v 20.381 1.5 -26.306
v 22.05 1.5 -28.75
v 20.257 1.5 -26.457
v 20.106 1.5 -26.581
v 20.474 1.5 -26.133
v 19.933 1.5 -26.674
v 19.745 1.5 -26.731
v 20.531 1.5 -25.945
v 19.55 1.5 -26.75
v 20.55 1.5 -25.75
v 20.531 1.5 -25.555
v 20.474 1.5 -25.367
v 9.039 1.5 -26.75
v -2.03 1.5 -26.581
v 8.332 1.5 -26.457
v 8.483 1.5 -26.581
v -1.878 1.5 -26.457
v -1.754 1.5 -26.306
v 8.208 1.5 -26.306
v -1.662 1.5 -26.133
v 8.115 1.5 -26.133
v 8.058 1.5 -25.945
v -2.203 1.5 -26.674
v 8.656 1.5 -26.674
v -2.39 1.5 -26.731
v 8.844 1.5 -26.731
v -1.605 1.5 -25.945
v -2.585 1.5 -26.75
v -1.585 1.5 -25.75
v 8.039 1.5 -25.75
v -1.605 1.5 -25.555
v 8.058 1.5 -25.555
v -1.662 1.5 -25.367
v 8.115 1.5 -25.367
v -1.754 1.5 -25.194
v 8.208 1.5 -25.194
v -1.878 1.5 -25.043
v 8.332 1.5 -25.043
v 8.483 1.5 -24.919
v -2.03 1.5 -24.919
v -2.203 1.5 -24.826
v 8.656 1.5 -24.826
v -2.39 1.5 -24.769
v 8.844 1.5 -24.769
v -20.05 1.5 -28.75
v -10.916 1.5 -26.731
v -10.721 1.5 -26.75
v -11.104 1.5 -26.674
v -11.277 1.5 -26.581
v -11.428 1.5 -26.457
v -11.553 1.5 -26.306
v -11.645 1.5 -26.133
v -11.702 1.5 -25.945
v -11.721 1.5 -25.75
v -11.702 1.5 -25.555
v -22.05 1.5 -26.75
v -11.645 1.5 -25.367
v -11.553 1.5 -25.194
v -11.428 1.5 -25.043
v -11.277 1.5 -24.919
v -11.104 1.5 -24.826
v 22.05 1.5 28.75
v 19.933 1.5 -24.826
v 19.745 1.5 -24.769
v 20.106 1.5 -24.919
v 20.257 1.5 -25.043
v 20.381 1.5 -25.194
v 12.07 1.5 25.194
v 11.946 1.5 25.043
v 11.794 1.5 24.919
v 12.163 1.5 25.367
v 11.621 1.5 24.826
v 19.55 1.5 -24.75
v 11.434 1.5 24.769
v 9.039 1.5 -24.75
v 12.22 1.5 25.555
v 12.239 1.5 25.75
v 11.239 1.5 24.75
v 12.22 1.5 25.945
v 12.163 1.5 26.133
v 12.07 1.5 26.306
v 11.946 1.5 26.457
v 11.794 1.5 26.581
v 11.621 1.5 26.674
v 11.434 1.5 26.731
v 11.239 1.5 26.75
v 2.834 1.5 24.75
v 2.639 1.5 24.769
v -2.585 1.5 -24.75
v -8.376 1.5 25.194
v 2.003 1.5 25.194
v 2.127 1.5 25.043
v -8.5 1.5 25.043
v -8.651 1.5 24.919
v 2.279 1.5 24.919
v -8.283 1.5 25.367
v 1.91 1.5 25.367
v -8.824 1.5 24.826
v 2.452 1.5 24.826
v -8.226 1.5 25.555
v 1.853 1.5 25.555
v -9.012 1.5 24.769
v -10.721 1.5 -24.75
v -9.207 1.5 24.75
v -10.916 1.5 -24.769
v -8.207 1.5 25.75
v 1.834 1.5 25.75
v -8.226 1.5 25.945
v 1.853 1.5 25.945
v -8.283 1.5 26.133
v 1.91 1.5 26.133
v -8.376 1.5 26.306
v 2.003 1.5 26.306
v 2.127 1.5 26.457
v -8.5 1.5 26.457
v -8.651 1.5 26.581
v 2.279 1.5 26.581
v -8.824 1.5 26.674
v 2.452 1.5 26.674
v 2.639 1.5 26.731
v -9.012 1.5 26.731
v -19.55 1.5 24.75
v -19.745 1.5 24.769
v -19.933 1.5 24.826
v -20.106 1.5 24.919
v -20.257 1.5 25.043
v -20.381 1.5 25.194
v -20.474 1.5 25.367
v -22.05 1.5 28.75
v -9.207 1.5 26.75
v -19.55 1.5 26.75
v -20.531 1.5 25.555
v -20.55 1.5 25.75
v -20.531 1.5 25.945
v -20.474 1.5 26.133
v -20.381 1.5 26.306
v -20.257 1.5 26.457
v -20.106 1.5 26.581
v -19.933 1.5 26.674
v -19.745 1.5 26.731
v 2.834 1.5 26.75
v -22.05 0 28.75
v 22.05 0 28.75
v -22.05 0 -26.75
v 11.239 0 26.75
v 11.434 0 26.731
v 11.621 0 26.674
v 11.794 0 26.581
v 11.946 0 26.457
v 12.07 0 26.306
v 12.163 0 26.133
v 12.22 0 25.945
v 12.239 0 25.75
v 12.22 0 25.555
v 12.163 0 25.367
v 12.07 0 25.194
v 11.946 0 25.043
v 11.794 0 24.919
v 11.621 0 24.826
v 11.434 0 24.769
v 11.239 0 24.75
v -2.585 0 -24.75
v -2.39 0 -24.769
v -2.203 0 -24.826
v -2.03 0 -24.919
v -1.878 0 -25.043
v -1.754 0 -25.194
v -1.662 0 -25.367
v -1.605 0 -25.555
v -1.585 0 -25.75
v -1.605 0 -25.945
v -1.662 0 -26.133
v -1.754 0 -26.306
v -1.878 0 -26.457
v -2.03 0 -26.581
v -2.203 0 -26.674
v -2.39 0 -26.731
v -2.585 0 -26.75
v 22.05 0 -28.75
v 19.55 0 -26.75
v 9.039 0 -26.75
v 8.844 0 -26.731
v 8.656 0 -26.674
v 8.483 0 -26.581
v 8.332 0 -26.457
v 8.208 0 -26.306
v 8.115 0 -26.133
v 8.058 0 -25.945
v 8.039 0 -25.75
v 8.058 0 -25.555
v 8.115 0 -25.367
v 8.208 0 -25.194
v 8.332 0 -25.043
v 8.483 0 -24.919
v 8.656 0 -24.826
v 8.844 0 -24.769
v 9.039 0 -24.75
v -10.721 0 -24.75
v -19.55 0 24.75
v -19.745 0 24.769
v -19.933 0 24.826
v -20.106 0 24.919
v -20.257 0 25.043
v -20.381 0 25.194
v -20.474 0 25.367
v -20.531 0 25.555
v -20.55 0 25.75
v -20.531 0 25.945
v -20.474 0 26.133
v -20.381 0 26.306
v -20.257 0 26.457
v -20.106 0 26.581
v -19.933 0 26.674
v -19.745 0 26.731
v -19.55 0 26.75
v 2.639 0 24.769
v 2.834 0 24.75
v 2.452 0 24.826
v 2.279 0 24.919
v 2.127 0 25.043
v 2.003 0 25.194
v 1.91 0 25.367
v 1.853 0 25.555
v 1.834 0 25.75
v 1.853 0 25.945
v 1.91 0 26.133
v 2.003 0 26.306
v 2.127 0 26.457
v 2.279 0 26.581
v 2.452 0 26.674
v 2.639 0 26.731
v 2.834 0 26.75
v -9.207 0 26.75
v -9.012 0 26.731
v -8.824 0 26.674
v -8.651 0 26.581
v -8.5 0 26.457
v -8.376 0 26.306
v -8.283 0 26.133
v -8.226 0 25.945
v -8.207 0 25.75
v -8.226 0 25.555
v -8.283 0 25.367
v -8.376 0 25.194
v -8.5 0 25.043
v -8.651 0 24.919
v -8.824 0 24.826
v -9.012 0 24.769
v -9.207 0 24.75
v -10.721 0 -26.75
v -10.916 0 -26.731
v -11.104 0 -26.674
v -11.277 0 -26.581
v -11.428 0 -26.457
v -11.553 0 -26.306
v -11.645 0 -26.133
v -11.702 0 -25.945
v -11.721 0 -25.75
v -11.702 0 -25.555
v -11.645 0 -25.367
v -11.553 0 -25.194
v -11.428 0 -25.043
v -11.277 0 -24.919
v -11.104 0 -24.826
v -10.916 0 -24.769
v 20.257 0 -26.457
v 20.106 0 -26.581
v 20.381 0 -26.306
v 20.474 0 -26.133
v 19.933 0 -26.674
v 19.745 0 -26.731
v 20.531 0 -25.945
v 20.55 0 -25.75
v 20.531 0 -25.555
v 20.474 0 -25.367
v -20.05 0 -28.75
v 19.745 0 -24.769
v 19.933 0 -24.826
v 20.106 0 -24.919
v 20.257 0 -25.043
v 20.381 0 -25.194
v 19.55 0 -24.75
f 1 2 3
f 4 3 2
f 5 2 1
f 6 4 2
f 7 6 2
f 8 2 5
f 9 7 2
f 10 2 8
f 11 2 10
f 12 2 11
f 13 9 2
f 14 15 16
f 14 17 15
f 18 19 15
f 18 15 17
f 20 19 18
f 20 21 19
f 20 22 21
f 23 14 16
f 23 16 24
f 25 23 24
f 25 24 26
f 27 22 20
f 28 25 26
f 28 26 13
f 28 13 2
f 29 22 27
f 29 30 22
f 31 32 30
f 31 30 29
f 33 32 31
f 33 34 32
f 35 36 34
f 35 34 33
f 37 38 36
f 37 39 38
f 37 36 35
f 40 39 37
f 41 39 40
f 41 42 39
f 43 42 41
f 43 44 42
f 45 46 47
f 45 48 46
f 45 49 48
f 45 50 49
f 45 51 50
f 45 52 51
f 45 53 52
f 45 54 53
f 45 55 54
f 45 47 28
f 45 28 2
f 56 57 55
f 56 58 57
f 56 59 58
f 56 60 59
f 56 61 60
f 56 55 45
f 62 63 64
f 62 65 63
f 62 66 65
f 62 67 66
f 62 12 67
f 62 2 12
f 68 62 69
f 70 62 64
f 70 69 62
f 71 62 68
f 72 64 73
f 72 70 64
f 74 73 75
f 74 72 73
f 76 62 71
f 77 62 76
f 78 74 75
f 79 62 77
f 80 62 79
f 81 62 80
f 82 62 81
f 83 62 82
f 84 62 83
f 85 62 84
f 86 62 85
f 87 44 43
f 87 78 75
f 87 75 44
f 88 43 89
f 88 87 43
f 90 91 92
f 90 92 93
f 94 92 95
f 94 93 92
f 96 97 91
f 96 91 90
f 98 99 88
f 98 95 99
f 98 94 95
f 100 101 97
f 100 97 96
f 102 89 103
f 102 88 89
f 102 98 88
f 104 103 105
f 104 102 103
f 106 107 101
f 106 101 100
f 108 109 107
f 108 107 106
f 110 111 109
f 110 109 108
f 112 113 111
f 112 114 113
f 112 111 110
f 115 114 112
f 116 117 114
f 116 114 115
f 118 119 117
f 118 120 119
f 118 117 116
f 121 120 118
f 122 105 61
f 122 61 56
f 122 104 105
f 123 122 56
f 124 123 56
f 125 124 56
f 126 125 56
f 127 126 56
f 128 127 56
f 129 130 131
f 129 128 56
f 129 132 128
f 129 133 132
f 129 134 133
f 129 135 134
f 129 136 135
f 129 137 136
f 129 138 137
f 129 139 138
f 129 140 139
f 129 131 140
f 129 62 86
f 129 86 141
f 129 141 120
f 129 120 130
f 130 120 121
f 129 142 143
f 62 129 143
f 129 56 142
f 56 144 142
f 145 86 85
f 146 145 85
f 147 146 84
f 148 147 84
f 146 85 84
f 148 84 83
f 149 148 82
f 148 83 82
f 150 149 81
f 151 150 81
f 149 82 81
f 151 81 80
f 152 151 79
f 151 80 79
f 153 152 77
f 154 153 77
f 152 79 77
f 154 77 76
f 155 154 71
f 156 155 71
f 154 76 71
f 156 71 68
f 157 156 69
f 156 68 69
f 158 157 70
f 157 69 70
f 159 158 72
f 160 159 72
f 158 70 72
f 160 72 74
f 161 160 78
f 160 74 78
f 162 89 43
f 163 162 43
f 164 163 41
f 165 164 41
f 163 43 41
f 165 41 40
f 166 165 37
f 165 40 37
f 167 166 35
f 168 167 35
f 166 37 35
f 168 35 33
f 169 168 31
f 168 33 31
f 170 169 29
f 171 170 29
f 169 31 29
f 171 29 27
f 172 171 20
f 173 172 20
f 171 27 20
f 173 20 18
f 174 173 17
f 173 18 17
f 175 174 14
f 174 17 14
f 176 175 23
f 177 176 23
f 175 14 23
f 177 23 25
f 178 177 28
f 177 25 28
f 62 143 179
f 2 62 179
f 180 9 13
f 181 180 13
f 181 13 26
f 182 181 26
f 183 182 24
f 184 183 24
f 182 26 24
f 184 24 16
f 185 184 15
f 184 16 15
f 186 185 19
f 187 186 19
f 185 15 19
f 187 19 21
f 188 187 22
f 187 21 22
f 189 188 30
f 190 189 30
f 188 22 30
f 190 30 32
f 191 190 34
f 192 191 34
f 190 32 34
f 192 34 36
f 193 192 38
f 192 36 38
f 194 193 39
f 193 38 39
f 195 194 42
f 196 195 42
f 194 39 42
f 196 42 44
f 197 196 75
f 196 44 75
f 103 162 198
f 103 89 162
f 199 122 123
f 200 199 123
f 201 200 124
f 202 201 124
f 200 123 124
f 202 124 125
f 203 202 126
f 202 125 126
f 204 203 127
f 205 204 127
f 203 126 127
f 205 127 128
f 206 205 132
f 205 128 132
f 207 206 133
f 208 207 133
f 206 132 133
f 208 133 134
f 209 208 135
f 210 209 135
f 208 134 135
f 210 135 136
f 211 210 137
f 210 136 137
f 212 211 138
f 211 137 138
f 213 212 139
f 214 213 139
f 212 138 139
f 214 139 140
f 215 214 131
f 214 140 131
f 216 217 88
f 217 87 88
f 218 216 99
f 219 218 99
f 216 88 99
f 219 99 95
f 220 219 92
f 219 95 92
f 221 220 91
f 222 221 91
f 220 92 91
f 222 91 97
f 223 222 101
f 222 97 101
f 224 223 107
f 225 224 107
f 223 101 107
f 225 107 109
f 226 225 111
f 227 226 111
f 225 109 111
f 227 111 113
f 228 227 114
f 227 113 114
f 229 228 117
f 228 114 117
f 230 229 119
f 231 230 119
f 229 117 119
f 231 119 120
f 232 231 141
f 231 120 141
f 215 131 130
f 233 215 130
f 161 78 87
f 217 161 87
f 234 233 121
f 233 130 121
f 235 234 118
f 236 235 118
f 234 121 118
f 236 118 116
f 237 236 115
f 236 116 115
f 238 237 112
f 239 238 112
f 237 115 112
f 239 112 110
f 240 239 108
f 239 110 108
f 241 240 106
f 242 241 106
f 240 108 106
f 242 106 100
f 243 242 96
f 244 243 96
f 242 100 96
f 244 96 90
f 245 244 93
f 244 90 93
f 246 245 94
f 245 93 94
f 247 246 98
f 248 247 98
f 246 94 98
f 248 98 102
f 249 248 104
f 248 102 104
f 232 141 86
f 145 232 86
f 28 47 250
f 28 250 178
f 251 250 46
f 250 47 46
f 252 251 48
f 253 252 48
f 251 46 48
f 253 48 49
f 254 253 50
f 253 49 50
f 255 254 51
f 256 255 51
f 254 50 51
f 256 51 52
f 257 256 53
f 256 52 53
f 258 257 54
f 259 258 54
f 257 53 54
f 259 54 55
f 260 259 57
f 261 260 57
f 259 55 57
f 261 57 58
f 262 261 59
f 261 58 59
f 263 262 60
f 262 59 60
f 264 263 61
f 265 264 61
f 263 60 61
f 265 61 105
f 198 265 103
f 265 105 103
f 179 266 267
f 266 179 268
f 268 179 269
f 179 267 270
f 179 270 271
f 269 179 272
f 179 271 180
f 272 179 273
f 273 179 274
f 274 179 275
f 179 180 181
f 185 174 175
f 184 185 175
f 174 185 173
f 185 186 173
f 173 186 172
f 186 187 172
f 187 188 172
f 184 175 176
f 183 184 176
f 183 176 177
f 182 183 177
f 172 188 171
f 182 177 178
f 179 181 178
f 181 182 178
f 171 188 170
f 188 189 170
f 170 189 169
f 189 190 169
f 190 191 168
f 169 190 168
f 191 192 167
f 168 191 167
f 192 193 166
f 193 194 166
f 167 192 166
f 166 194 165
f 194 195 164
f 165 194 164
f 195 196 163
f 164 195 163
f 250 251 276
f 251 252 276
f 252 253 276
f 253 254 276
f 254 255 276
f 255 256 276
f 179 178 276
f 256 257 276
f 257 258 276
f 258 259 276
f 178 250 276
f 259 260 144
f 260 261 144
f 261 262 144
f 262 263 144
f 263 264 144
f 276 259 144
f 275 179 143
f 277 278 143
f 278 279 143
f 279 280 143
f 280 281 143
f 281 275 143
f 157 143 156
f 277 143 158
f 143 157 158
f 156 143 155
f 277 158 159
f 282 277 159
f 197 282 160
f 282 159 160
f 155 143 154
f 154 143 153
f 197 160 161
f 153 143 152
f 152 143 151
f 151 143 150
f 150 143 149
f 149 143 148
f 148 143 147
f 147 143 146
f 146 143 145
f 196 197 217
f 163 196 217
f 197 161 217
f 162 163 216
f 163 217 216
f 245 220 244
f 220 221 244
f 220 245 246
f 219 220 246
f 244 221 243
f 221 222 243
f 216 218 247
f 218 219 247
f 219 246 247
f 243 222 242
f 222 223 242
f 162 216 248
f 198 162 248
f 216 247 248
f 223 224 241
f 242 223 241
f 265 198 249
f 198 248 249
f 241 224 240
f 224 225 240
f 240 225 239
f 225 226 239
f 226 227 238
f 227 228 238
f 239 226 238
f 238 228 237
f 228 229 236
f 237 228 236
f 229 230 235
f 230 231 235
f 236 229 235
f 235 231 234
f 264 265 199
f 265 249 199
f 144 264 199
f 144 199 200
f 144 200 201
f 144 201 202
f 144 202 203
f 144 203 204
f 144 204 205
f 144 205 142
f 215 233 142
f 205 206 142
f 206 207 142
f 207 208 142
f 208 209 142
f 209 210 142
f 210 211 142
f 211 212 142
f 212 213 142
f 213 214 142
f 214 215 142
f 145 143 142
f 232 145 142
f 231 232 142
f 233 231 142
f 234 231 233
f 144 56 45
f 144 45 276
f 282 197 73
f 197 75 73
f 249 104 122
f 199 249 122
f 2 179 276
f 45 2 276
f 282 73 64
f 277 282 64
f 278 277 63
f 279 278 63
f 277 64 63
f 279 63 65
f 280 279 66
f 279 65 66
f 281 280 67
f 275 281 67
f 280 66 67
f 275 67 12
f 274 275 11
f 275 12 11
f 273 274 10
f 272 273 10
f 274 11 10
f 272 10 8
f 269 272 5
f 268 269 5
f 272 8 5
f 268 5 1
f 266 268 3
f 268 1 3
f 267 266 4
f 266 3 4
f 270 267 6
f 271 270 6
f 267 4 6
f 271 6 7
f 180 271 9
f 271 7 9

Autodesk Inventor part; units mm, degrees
ref_plane "YZ Plane" through (0, 0, 0) normal (1, 0, 0) x (0, 1, 0)
ref_plane "XZ Plane" through (0, 0, 0) normal (0, 1, 0) x (-1, 0, 0)
ref_plane "XY Plane" through (0, 0, 0) normal (0, 0, 1) x (1, 0, 0)
sketch "Sketch1" plane through (0, 0, 0) normal (0, 1, 0) x (-1, 0, 0)
  line L0 (-22.05, -28.75) -> (22.05, -28.75)
  line L1 (22.05, -28.75) -> (22.05, 28.75)
  line L2 (22.05, 28.75) -> (-22.05, 28.75)
  line L3 (-22.05, 28.75) -> (-22.05, -28.75)
  line L4 (-22.05, -28.75) -> (22.05, 28.75) construction
  line L5 (22.05, -28.75) -> (-22.05, 28.75) construction
  point P0 (0, 0)
  dimension "d0" = 57.5
  dimension "d1" = 44.1
extrude "Extrusion1" add sketch "Sketch1" along normal blind 1.5
sketch "Sketch4" plane through (0, 1.5, 0) normal (0, 1, 0) x (1, 0, 0)
  line L0 (22.6381, -25.9185) -> (13.7388, -25.9185)
  line L1 (13.7388, -25.9185) -> (13.7388, -21.956)
  line L2 (13.7388, -21.956) -> (22.6381, -21.956)
  line L3 (22.6381, -21.956) -> (22.6381, -25.9185)
  line L4 (11.4165, -21.956) -> (0.7633, -21.956)
  line L5 (0.7633, -21.956) -> (0.7633, -24.4569)
  line L6 (0.7633, -24.4569) -> (11.4165, -24.4569)
  line L7 (11.4165, -24.4569) -> (11.4165, -21.956)
  line L8 (-0.6658, -26.6006) -> (-6.707, -26.6006)
  line L9 (-6.707, -26.6006) -> (-6.707, -22.3783)
  line L10 (-6.707, -22.3783) -> (-0.6658, -22.3783)
  line L11 (-0.6658, -22.3783) -> (-0.6658, -26.6006)
  line L12 (-6.707, -24.392) -> (-14.5426, -24.392)
  line L13 (-14.5426, -24.392) -> (-14.5426, -21.0953)
  line L14 (-14.5426, -21.0953) -> (-6.707, -21.0953)
  line L15 (-6.707, -21.0953) -> (-6.707, -24.392)
  line L16 (-14.5426, -21.0953) -> (-11.8996, -21.0953)
  line L17 (-11.8996, -21.0953) -> (-11.8996, -19.5363)
  line L18 (-11.8996, -19.5363) -> (-14.5426, -19.5363)
  line L19 (-14.5426, -19.5363) -> (-14.5426, -21.0953)
  line L20 (-21.1238, -24.2621) -> (-17.4211, -24.2621)
  line L21 (-17.4211, -24.2621) -> (-17.4211, -21.956)
  line L22 (-17.4211, -21.956) -> (-21.1238, -21.956)
  line L23 (-21.1238, -21.956) -> (-21.1238, -24.2621)
  line L24 (5.6616, -20.7705) -> (1.894, -20.7705)
  line L25 (1.894, -20.7705) -> (1.894, -17.3277)
  line L26 (1.894, -17.3277) -> (5.6616, -17.3277)
  line L27 (5.6616, -17.3277) -> (5.6616, -20.7705)
  line L28 (-2.848, -19.9261) -> (-5.2515, -19.9261)
  line L29 (-5.2515, -19.9261) -> (-5.2515, -18.3346)
  line L30 (-5.2515, -18.3346) -> (-2.848, -18.3346)
  line L31 (-2.848, -18.3346) -> (-2.848, -19.9261)
  line L32 (-17.2689, -17.0029) -> (-14.5426, -17.0029)
  line L33 (-14.5426, -17.0029) -> (-14.5426, -13.4952)
  line L34 (-14.5426, -13.4952) -> (-17.2689, -13.4952)
  line L35 (-17.2689, -13.4952) -> (-17.2689, -17.0029)
  line L36 (15.925, -11.4814) -> (12.4173, -11.4814)
  line L37 (12.4173, -11.4814) -> (12.4173, -14.7294)
  line L38 (12.4173, -14.7294) -> (15.925, -14.7294)
  line L39 (15.925, -14.7294) -> (15.925, -11.4814)
  line L40 (-2.1335, 9.0455) -> (1.894, 9.0455)
  line L41 (1.894, 9.0455) -> (1.894, -8.9481)
  line L42 (1.894, -8.9481) -> (-2.1335, -8.9481)
  line L43 (-2.1335, -8.9481) -> (-2.1335, 9.0455)
  line L44 (4.5573, 3.3291) -> (1.6991, 3.3291)
  line L45 (1.6991, 3.3291) -> (1.6991, 0.6009)
  line L46 (1.6991, 0.6009) -> (4.5573, 0.6009)
  line L47 (4.5573, 0.6009) -> (4.5573, 3.3291)
  line L48 (-17.5287, 13.7631) -> (-14.1519, 13.7631)
  line L49 (-14.1519, 13.7631) -> (-14.1519, 10.4096)
  line L50 (-14.1519, 10.4096) -> (-17.5287, 10.4096)
  line L51 (-17.5287, 10.4096) -> (-17.5287, 13.7631)
  line L52 (16.8052, 16.3739) -> (14.7212, 16.3739)
  line L53 (14.7212, 16.3739) -> (14.7212, 12.9633)
  line L54 (14.7212, 12.9633) -> (16.8052, 12.9633)
  line L55 (16.8052, 12.9633) -> (16.8052, 16.3739)
  line L56 (-23.3919, 26.0219) -> (-13.2211, 26.0219)
  line L57 (-13.2211, 26.0219) -> (-13.2211, 21.0711)
  line L58 (-13.2211, 21.0711) -> (-23.3919, 21.0711)
  line L59 (-23.3919, 21.0711) -> (-23.3919, 26.0219)
  line L60 (-20.3793, 16.7032) -> (-17.8455, 16.7032)
  line L61 (-17.8455, 16.7032) -> (-17.8455, 19.4346)
  line L62 (-17.8455, 19.4346) -> (-20.3793, 19.4346)
  line L63 (-20.3793, 19.4346) -> (-20.3793, 16.7032)
  line L64 (-11.1745, 21.8169) -> (-0.7032, 21.8169)
  line L65 (-0.7032, 21.8169) -> (-0.7032, 24.5446)
  line L66 (-0.7032, 24.5446) -> (-11.1745, 24.5446)
  line L67 (-11.1745, 24.5446) -> (-11.1745, 21.8169)
  line L68 (-2.5673, 18.6812) -> (-4.8458, 18.6812)
  line L69 (-4.8458, 18.6812) -> (-4.8458, 22.2038)
  line L70 (-4.8458, 22.2038) -> (-2.5673, 22.2038)
  line L71 (-2.5673, 22.2038) -> (-2.5673, 18.6812)
  line L72 (0.9146, 27.1153) -> (6.539, 27.1153)
  line L73 (6.539, 27.1153) -> (6.539, 22.2038)
  line L74 (6.539, 22.2038) -> (0.9146, 22.2038)
  line L75 (0.9146, 22.2038) -> (0.9146, 27.1153)
  line L76 (2.2307, 17.9158) -> (4.5573, 17.9158)
  line L77 (4.5573, 17.9158) -> (4.5573, 22.2038)
  line L78 (4.5573, 22.2038) -> (2.2307, 22.2038)
  line L79 (2.2307, 22.2038) -> (2.2307, 17.9158)
  line L80 (6.0899, 24.1958) -> (14.5454, 24.1958)
  line L81 (14.5454, 24.1958) -> (14.5454, 21.5323)
  line L82 (14.5454, 21.5323) -> (6.0899, 21.5323)
  line L83 (6.0899, 21.5323) -> (6.0899, 24.1958)
  line L84 (14.2886, 21.5323) -> (11.9019, 21.5323)
  line L85 (11.9019, 21.5323) -> (11.9019, 19.3557)
  line L86 (11.9019, 19.3557) -> (14.2886, 19.3557)
  line L87 (14.2886, 19.3557) -> (14.2886, 21.5323)
  line L88 (21.4363, 24.0758) -> (17.64, 24.0758)
  line L89 (17.64, 24.0758) -> (17.64, 21.5323)
  line L90 (17.64, 21.5323) -> (21.4363, 21.5323)
  line L91 (21.4363, 21.5323) -> (21.4363, 24.0758)
  point P0 (0, 0)
  point P1 (6.539, 24.1958)
  point P2 (6.0899, 22.2038)
extrude "Clearance Cutouts" [suppressed]
sketch "Sketch5" plane through (0, 1.5, 0) normal (0, 1, 0) x (1, 0, 0)
  line L0 (19.55, 25.75) -> (9.039, 25.75) construction
  line L1 (19.55, 26.75) -> (9.039, 26.75)
  line L2 (9.039, 24.75) -> (19.55, 24.75)
  arc A0 (19.55, 24.75) -> (19.55, 26.75) centre (19.55, 25.75) ccw
  arc A1 (9.039, 26.75) -> (9.039, 24.75) centre (9.039, 25.75) ccw
  line L3 (22.05, -28.75) -> (22.05, 28.75) projected
  line L4 (-2.5854, 25.75) -> (-10.7211, 25.75) construction
  line L5 (-2.5854, 24.75) -> (-10.7211, 24.75)
  line L6 (-10.7211, 26.75) -> (-2.5854, 26.75)
  arc A2 (-2.5854, 24.75) -> (-2.5854, 26.75) centre (-2.5854, 25.75) ccw
  arc A3 (-10.7211, 26.75) -> (-10.7211, 24.75) centre (-10.7211, 25.75) ccw
  line L7 (-19.55, -25.75) -> (-9.207, -25.75) construction
  line L8 (-22.05, -28.75) -> (22.05, -28.75) projected
  line L9 (-19.55, -26.75) -> (-9.207, -26.75)
  line L10 (-9.207, -24.75) -> (-19.55, -24.75)
  arc A4 (-19.55, -24.75) -> (-19.55, -26.75) centre (-19.55, -25.75) ccw
  arc A5 (-9.207, -26.75) -> (-9.207, -24.75) centre (-9.207, -25.75) ccw
  line L11 (-22.05, 28.75) -> (-22.05, -28.75) projected
  line L12 (2.8342, -25.75) -> (11.2388, -25.75) construction
  line L13 (2.8342, -26.75) -> (11.2388, -26.75)
  line L14 (11.2388, -24.75) -> (2.8342, -24.75)
  arc A6 (2.8342, -24.75) -> (2.8342, -26.75) centre (2.8342, -25.75) ccw
  arc A7 (11.2388, -26.75) -> (11.2388, -24.75) centre (11.2388, -25.75) ccw
  line L15 (22.05, 28.75) -> (-22.05, 28.75) projected
  point P0 (0, 0)
  point P1 (14.2945, 25.75)
  point P2 (8.039, 25.75)
  point P3 (20.55, 25.75)
  point P4 (-6.6533, 25.75)
  point P5 (-1.5854, 25.75)
  point P6 (-11.7211, 25.75)
  point P7 (-14.3785, -25.75)
  point P8 (-8.207, -25.75)
  point P9 (-20.55, -25.75)
  point P10 (7.0365, -25.75)
  point P11 (1.8342, -25.75)
  point P12 (12.2388, -25.75)
  dimension "d23" = 2
  dimension "d26" = 1.5
  dimension "d30" = 1
  dimension "d31" = 1
  dimension "d34" = 1.5
  dimension "d35" = 1
  dimension "d44" = 3
  dimension "d45" = 15.3967
  dimension "d46" = 10.1357
  dimension "d47" = 3
  dimension "d48" = 12.511
  dimension "d49" = 3
  dimension "d50" = 3
  dimension "d51" = 10.4046
  dimension "d52" = 9.8112
  dimension "d53" = 12.343
extrude "Extrusion4" cut sketch "Sketch5" against normal blind 1.5 contours A0 L2 A1 L1 | L5 A3 L6 A2 | A4 L10 A5 L9 | A6 L14 A7 L13
chamfer "Chamfer1" distance 2 angle 45 1 edges at (-22.05, 0.75, -28.75)
properties part number "Flex Holder V1 TPMockup" material "Thermoplastic Resin"
